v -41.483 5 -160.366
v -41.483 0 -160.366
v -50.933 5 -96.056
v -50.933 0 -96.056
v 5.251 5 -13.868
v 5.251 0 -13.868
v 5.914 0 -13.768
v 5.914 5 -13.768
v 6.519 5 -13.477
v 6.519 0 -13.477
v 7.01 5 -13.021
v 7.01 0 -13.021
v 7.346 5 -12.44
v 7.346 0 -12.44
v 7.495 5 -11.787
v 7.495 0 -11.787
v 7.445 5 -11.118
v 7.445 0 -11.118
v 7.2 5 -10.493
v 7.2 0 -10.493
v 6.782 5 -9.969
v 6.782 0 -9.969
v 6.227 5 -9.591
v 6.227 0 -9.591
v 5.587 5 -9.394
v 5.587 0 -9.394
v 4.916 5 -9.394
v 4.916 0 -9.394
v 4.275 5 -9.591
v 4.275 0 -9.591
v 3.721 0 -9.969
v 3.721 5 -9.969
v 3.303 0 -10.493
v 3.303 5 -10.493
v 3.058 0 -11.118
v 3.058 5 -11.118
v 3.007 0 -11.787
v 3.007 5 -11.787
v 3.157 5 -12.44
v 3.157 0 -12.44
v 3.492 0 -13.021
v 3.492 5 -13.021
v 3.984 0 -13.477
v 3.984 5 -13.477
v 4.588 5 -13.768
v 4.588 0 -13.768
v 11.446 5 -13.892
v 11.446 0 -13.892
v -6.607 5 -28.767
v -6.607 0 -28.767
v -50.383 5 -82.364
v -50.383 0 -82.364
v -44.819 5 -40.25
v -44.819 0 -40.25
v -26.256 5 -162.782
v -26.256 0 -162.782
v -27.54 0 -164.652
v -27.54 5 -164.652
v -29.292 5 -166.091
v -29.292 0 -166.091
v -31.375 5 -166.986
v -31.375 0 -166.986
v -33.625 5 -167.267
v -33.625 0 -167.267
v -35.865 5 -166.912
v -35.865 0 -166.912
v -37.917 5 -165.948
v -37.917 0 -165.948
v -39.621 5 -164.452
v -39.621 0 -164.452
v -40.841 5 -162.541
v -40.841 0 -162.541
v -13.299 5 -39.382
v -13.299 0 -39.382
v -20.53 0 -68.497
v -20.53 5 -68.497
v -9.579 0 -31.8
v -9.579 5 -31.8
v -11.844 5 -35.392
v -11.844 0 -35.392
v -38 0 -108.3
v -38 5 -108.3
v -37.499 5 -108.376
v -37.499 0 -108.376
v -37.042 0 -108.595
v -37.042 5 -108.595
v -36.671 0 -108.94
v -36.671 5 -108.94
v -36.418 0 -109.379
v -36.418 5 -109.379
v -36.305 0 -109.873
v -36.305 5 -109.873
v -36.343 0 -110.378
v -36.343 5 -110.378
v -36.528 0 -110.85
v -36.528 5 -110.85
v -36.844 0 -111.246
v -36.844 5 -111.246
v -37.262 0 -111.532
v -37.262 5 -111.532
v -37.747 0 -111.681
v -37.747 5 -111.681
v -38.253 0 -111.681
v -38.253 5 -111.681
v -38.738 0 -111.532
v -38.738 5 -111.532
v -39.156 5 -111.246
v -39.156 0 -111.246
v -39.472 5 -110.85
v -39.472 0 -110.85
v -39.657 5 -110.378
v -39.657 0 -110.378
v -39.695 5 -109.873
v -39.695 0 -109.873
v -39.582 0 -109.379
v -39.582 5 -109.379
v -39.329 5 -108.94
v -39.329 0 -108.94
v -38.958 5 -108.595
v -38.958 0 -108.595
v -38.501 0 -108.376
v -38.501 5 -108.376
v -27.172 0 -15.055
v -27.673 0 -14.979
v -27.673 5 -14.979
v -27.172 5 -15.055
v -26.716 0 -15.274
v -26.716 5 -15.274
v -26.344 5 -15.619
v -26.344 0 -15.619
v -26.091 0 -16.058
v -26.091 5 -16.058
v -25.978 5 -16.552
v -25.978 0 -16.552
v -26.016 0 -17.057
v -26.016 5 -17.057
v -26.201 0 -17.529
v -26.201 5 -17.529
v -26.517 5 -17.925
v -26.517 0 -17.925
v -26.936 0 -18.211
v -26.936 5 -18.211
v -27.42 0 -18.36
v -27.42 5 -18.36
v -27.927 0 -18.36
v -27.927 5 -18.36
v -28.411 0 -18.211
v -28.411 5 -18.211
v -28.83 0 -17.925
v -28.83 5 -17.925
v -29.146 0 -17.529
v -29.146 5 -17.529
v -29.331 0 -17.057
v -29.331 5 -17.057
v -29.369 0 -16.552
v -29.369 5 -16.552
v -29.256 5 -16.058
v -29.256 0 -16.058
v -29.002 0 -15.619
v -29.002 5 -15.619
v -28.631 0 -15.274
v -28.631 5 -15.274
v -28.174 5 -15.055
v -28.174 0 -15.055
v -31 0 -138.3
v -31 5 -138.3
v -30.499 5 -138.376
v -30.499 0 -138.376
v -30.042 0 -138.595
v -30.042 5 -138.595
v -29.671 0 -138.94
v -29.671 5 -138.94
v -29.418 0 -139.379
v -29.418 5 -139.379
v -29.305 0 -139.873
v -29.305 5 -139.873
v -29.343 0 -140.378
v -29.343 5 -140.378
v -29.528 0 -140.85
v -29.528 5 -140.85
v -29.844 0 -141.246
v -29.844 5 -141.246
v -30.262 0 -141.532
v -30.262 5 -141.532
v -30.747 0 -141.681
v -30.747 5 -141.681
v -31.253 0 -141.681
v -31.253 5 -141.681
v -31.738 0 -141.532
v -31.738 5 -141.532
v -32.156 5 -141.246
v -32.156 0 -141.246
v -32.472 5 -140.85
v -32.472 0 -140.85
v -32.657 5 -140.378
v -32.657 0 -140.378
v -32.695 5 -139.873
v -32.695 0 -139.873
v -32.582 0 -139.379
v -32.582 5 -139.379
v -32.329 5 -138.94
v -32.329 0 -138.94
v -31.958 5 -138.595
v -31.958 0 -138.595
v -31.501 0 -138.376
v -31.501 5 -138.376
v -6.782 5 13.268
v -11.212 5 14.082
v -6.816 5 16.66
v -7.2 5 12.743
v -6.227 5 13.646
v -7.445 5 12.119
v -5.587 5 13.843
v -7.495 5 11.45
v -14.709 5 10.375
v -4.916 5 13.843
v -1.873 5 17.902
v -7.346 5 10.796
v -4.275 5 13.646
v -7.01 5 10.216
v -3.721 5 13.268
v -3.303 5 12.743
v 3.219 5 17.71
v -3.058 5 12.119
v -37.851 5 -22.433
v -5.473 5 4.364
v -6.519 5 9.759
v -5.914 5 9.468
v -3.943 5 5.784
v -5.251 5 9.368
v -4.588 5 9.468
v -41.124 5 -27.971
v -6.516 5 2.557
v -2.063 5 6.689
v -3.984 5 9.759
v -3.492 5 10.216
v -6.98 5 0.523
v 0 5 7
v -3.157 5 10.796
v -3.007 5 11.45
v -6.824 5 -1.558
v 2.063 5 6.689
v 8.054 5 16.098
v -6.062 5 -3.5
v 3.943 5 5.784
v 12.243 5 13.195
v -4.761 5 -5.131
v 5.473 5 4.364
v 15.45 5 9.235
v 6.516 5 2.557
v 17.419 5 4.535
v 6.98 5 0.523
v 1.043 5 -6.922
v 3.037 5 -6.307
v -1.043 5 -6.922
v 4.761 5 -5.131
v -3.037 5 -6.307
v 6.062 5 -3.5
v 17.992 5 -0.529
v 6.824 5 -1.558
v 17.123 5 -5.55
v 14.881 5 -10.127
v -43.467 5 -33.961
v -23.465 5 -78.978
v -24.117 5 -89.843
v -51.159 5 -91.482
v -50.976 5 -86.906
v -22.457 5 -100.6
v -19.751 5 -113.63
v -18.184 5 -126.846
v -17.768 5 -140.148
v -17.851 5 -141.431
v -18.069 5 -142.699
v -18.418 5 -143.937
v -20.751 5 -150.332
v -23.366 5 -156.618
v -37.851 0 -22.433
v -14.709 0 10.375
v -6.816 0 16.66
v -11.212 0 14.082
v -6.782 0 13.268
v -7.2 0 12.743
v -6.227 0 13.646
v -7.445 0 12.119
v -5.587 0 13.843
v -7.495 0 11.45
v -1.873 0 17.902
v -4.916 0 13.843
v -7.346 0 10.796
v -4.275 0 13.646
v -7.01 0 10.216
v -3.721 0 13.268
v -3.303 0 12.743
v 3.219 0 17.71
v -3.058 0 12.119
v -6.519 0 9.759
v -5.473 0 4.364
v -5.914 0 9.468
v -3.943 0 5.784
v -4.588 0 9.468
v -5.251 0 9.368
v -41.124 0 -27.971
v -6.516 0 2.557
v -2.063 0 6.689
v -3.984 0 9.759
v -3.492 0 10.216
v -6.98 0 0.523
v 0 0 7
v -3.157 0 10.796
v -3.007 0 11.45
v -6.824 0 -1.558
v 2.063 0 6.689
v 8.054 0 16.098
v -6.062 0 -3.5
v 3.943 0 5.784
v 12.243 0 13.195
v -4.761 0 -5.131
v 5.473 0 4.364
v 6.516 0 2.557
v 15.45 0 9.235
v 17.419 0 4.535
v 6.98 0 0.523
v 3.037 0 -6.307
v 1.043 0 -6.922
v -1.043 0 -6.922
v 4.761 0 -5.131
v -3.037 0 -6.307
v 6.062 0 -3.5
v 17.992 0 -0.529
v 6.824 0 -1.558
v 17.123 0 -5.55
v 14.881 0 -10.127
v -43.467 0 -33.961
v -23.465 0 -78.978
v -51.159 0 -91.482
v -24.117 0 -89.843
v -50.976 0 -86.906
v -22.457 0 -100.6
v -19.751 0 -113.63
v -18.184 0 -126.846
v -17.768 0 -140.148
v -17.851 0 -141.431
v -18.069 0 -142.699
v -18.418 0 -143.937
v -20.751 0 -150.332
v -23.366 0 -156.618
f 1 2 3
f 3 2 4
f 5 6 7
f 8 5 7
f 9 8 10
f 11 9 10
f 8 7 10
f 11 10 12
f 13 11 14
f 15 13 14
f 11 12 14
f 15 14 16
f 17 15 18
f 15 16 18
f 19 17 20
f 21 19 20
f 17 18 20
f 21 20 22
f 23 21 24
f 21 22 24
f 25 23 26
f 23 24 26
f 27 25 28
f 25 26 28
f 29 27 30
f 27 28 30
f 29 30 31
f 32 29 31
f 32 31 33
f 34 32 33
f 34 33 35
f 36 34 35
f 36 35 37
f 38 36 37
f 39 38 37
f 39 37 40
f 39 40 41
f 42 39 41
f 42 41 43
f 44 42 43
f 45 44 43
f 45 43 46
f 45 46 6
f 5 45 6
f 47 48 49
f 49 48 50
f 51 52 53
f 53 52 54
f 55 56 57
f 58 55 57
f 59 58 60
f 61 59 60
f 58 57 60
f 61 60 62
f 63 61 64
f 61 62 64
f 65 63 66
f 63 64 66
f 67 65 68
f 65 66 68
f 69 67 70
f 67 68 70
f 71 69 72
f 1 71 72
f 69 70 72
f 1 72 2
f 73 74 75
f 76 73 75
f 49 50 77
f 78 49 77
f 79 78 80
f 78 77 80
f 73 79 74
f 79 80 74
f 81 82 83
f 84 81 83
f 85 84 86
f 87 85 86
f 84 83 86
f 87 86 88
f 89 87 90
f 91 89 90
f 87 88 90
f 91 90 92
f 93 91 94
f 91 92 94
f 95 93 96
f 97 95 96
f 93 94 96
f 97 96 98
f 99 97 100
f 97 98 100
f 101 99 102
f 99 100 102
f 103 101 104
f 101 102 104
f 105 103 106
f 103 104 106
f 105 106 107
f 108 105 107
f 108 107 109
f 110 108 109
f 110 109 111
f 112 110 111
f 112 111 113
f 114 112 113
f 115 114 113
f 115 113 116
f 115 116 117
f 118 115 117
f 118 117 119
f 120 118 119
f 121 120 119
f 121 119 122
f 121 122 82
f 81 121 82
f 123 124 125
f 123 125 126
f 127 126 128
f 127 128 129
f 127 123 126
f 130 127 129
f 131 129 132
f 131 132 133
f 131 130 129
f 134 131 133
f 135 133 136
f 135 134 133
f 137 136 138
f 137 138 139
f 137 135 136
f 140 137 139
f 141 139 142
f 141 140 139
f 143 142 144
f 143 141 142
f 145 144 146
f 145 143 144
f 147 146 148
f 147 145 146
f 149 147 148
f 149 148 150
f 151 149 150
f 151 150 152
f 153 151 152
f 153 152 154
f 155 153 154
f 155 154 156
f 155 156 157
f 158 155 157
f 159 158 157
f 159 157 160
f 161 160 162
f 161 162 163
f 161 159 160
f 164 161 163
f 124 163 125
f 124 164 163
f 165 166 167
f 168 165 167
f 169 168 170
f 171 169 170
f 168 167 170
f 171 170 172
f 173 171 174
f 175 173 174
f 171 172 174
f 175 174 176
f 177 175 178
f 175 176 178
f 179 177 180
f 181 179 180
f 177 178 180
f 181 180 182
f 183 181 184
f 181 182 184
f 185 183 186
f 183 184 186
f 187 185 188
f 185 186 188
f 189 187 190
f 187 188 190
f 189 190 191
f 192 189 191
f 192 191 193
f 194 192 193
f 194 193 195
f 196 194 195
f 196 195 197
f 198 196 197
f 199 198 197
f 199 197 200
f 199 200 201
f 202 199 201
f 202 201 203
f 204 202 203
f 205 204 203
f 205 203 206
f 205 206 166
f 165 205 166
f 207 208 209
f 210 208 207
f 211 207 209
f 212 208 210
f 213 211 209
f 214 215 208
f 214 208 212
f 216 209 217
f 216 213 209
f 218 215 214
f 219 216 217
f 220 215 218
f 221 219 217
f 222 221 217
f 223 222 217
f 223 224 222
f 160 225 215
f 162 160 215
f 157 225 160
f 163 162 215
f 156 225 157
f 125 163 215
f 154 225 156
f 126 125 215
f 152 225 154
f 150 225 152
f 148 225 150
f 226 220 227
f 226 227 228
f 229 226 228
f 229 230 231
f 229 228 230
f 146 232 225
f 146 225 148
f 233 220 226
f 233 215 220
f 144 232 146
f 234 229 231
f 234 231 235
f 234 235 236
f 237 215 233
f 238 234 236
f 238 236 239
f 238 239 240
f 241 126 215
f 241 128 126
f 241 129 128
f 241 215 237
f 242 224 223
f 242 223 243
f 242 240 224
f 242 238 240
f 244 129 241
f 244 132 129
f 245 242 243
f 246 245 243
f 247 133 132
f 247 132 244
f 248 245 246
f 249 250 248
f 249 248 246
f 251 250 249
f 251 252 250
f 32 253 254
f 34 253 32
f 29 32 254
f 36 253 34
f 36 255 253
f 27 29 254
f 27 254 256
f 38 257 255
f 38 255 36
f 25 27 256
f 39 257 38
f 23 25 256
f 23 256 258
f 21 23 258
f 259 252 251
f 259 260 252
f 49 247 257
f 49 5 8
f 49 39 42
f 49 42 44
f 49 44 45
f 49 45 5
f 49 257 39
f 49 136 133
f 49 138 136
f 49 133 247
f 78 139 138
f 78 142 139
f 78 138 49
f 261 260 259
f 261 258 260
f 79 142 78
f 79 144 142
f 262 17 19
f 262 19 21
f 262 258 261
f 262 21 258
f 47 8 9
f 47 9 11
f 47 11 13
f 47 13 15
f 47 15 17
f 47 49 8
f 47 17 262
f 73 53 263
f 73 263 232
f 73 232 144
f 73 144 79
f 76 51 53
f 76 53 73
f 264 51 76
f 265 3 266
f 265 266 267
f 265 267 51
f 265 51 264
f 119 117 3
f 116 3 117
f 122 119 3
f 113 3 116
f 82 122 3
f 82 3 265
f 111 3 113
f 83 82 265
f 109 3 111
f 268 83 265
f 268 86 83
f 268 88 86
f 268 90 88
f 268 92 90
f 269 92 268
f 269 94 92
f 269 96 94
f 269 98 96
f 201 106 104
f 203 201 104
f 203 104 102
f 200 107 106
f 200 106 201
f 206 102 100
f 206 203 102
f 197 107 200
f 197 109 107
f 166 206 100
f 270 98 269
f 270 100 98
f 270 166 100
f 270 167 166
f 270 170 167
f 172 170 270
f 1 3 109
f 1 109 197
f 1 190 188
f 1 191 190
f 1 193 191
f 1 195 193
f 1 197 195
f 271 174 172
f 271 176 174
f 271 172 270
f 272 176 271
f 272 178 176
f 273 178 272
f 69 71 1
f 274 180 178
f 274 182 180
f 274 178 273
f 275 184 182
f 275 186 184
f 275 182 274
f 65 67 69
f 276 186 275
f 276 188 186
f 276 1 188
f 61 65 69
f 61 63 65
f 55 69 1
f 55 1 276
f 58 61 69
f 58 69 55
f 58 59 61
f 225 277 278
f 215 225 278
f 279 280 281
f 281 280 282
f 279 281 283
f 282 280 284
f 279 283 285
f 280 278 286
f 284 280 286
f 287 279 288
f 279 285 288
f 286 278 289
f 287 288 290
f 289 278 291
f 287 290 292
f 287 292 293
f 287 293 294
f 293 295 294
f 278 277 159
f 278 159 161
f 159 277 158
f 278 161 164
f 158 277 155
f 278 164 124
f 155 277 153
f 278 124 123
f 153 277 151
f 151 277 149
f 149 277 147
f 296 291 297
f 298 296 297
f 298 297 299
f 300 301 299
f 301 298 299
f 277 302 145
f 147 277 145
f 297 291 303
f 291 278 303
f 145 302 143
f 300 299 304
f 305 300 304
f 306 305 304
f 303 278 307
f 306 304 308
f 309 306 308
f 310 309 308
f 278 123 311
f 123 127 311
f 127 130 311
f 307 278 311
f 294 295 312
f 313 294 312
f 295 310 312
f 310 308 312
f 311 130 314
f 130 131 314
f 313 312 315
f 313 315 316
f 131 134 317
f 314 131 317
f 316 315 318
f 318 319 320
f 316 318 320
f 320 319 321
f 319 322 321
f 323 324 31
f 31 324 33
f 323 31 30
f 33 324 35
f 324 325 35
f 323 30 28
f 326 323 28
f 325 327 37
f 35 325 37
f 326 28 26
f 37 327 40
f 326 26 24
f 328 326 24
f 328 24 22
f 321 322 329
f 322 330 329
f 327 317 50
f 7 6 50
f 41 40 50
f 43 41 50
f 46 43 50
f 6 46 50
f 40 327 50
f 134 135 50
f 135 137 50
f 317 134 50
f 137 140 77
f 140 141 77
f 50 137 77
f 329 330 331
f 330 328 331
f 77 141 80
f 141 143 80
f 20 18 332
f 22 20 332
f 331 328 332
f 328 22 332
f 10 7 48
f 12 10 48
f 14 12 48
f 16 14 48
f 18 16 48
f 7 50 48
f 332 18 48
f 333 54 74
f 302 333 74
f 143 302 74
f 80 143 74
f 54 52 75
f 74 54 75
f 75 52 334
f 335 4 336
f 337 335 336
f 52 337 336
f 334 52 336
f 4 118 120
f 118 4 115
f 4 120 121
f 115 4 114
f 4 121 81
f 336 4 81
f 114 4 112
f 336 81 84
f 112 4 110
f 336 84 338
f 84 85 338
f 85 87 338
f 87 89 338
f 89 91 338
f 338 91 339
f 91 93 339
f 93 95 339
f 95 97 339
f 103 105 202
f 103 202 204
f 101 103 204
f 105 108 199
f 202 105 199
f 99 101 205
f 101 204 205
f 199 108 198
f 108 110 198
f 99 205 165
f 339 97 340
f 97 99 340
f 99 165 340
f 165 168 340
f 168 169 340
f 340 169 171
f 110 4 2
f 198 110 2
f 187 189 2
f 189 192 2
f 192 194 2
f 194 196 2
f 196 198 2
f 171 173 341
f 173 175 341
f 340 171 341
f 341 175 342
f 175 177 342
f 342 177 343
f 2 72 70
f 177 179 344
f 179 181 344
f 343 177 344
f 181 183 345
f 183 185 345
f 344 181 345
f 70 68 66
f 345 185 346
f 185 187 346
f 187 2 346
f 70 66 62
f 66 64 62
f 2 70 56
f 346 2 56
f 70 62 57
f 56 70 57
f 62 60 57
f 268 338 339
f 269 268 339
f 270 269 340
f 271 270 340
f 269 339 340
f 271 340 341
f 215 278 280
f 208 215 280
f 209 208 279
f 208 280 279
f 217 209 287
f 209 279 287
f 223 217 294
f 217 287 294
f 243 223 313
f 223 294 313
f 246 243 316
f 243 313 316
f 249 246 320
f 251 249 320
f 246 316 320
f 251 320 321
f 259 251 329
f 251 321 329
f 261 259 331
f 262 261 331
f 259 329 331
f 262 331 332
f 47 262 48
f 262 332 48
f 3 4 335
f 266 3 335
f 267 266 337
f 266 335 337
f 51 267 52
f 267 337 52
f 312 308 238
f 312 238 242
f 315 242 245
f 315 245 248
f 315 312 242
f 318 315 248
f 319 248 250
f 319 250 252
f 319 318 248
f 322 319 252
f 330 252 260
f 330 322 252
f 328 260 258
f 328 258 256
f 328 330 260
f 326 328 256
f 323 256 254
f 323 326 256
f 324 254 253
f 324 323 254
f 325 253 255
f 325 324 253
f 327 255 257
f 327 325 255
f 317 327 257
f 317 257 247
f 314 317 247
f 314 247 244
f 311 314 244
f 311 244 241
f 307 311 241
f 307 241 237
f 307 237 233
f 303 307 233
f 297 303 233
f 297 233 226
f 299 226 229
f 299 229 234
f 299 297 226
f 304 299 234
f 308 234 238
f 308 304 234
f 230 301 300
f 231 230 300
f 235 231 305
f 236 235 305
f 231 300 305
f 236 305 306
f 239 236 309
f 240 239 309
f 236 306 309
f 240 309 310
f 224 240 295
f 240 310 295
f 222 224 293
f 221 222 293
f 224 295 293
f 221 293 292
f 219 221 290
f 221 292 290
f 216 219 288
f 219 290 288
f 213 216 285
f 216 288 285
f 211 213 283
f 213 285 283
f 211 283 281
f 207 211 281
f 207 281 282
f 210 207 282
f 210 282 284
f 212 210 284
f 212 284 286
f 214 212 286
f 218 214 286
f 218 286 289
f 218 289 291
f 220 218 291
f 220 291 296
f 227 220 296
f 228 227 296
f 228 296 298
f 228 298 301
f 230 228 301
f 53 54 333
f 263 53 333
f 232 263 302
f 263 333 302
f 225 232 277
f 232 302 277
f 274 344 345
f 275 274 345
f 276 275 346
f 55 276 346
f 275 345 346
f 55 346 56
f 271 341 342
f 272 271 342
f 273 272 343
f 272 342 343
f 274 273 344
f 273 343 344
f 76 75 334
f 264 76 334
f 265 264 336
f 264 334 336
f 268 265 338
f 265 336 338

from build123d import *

# Parameters (mm, degrees)
SKETCH1_R                = 7
SKETCH1_R_2              = 1.7
BOSS_EXTRUDE2_DEPTH      = 5
CUT_EXTRUDE1_REACH       = 176.989
SKETCH3_R                = 1.7
M4_CLEARANCE_HOLE1_D     = 4.5
M4_CLEARANCE_HOLE1_DEPTH = 10.1
M4_CLEARANCE_HOLE1_TIP   = 1.351936393


with BuildPart() as part:
    # Sketch1 → Boss-Extrude2 (new body)
    with BuildSketch(Plane(origin=(0, 0, 0), x_dir=(1, 0, 0), z_dir=(0, 1, 0))):
        with BuildLine():
            Line((11.446477506, 13.891657666), (-6.606953629, 28.767362089))
            ThreePointArc((-6.606953629, 28.767362089), (-10.806918693, 33.53614027), (-13.298943796, 39.38171661))
            Line((-13.298943796, 39.38171661), (-20.530174792, 68.49716437))
            ThreePointArc((-20.530174792, 68.49716437), (-24.08112857, 84.393152776), (-22.456551163, 100.599709115))
            ThreePointArc((-22.456551163, 100.599709115), (-18.824269383, 120.221092129), (-17.76802696, 140.147870449))
            ThreePointArc((-17.76802696, 140.147870449), (-17.943181625, 142.067888002), (-18.417828761, 143.936539027))
            ThreePointArc((-18.417828761, 143.936539027), (-22.023480215, 153.489775682), (-26.256294904, 162.782156045))
            ThreePointArc((-26.256294904, 162.782156045), (-34.757388509, 167.168565439), (-41.482617684, 160.365590178))
            Line((-41.482617684, 160.365590178), (-50.932711484, 96.056215067))
            ThreePointArc((-50.932711484, 96.056215067), (-51.118515181, 89.191813761), (-50.383474997, 82.364351257))
            Line((-50.383474997, 82.364351257), (-44.819294227, 40.249739786))
            ThreePointArc((-44.819294227, 40.249739786), (-42.41581584, 30.91866257), (-37.850662253, 22.433081678))
            Line((-37.850662253, 22.433081678), (-14.709041721, -10.375167067))
            ThreePointArc((-14.709041721, -10.375167067), (12.242580486, -13.195424322), (11.446477506, 13.891657666))
        make_face()
        with Locations(Location((0, 0, 0), (0, 0, 270))):
            Circle(SKETCH1_R, mode=Mode.SUBTRACT)
        with Locations(Location((-27.673284612, 16.679008328, 0), (0, 0, 270))):
            Circle(SKETCH1_R_2, mode=Mode.SUBTRACT)
    extrude(amount=BOSS_EXTRUDE2_DEPTH)

    # Sketch3 → Cut-Extrude1 (cut, up to next)
    with BuildSketch(Plane(origin=(0, 5, 0), x_dir=(1, 0, 0), z_dir=(0, 1, 0)), mode=Mode.PRIVATE) as cut_extrude1_sk1:
        with Locations(Location((-31, 140, 0), (0, 0, 270))):
            Circle(SKETCH3_R)
    cut_extrude1_tool1 = extrude(cut_extrude1_sk1.sketch, amount=-CUT_EXTRUDE1_REACH, mode=Mode.PRIVATE) & part.part
    # Sketch3 → Cut-Extrude1 (cut, up to next)
    with BuildSketch(Plane(origin=(0, 5, 0), x_dir=(1, 0, 0), z_dir=(0, 1, 0)), mode=Mode.PRIVATE) as cut_extrude1_sk2:
        with Locations(Location((-38, 110, 0), (0, 0, 270))):
            Circle(SKETCH3_R)
    cut_extrude1_tool2 = extrude(cut_extrude1_sk2.sketch, amount=-CUT_EXTRUDE1_REACH, mode=Mode.PRIVATE) & part.part
    add(cut_extrude1_tool1.solids().sort_by_distance((-31, 5, -140))[0], mode=Mode.SUBTRACT)
    add(cut_extrude1_tool2.solids().sort_by_distance((-38, 5, -110))[0], mode=Mode.SUBTRACT)

    # M4 Clearance Hole1
    with Locations(Plane(origin=(-5.251206507, 5, 11.618404805), x_dir=(0, 0, 1), z_dir=(0, 1, 0))):
        with Locations((0, 0), (-23.23680961, 10.502413014)):
            Hole(M4_CLEARANCE_HOLE1_D / 2, depth=M4_CLEARANCE_HOLE1_DEPTH)
            with Locations((0, 0, -(M4_CLEARANCE_HOLE1_DEPTH + M4_CLEARANCE_HOLE1_TIP / 2))):  # 118° drill point
                Cone(0, M4_CLEARANCE_HOLE1_D / 2, M4_CLEARANCE_HOLE1_TIP, mode=Mode.SUBTRACT)


solid = part.part
